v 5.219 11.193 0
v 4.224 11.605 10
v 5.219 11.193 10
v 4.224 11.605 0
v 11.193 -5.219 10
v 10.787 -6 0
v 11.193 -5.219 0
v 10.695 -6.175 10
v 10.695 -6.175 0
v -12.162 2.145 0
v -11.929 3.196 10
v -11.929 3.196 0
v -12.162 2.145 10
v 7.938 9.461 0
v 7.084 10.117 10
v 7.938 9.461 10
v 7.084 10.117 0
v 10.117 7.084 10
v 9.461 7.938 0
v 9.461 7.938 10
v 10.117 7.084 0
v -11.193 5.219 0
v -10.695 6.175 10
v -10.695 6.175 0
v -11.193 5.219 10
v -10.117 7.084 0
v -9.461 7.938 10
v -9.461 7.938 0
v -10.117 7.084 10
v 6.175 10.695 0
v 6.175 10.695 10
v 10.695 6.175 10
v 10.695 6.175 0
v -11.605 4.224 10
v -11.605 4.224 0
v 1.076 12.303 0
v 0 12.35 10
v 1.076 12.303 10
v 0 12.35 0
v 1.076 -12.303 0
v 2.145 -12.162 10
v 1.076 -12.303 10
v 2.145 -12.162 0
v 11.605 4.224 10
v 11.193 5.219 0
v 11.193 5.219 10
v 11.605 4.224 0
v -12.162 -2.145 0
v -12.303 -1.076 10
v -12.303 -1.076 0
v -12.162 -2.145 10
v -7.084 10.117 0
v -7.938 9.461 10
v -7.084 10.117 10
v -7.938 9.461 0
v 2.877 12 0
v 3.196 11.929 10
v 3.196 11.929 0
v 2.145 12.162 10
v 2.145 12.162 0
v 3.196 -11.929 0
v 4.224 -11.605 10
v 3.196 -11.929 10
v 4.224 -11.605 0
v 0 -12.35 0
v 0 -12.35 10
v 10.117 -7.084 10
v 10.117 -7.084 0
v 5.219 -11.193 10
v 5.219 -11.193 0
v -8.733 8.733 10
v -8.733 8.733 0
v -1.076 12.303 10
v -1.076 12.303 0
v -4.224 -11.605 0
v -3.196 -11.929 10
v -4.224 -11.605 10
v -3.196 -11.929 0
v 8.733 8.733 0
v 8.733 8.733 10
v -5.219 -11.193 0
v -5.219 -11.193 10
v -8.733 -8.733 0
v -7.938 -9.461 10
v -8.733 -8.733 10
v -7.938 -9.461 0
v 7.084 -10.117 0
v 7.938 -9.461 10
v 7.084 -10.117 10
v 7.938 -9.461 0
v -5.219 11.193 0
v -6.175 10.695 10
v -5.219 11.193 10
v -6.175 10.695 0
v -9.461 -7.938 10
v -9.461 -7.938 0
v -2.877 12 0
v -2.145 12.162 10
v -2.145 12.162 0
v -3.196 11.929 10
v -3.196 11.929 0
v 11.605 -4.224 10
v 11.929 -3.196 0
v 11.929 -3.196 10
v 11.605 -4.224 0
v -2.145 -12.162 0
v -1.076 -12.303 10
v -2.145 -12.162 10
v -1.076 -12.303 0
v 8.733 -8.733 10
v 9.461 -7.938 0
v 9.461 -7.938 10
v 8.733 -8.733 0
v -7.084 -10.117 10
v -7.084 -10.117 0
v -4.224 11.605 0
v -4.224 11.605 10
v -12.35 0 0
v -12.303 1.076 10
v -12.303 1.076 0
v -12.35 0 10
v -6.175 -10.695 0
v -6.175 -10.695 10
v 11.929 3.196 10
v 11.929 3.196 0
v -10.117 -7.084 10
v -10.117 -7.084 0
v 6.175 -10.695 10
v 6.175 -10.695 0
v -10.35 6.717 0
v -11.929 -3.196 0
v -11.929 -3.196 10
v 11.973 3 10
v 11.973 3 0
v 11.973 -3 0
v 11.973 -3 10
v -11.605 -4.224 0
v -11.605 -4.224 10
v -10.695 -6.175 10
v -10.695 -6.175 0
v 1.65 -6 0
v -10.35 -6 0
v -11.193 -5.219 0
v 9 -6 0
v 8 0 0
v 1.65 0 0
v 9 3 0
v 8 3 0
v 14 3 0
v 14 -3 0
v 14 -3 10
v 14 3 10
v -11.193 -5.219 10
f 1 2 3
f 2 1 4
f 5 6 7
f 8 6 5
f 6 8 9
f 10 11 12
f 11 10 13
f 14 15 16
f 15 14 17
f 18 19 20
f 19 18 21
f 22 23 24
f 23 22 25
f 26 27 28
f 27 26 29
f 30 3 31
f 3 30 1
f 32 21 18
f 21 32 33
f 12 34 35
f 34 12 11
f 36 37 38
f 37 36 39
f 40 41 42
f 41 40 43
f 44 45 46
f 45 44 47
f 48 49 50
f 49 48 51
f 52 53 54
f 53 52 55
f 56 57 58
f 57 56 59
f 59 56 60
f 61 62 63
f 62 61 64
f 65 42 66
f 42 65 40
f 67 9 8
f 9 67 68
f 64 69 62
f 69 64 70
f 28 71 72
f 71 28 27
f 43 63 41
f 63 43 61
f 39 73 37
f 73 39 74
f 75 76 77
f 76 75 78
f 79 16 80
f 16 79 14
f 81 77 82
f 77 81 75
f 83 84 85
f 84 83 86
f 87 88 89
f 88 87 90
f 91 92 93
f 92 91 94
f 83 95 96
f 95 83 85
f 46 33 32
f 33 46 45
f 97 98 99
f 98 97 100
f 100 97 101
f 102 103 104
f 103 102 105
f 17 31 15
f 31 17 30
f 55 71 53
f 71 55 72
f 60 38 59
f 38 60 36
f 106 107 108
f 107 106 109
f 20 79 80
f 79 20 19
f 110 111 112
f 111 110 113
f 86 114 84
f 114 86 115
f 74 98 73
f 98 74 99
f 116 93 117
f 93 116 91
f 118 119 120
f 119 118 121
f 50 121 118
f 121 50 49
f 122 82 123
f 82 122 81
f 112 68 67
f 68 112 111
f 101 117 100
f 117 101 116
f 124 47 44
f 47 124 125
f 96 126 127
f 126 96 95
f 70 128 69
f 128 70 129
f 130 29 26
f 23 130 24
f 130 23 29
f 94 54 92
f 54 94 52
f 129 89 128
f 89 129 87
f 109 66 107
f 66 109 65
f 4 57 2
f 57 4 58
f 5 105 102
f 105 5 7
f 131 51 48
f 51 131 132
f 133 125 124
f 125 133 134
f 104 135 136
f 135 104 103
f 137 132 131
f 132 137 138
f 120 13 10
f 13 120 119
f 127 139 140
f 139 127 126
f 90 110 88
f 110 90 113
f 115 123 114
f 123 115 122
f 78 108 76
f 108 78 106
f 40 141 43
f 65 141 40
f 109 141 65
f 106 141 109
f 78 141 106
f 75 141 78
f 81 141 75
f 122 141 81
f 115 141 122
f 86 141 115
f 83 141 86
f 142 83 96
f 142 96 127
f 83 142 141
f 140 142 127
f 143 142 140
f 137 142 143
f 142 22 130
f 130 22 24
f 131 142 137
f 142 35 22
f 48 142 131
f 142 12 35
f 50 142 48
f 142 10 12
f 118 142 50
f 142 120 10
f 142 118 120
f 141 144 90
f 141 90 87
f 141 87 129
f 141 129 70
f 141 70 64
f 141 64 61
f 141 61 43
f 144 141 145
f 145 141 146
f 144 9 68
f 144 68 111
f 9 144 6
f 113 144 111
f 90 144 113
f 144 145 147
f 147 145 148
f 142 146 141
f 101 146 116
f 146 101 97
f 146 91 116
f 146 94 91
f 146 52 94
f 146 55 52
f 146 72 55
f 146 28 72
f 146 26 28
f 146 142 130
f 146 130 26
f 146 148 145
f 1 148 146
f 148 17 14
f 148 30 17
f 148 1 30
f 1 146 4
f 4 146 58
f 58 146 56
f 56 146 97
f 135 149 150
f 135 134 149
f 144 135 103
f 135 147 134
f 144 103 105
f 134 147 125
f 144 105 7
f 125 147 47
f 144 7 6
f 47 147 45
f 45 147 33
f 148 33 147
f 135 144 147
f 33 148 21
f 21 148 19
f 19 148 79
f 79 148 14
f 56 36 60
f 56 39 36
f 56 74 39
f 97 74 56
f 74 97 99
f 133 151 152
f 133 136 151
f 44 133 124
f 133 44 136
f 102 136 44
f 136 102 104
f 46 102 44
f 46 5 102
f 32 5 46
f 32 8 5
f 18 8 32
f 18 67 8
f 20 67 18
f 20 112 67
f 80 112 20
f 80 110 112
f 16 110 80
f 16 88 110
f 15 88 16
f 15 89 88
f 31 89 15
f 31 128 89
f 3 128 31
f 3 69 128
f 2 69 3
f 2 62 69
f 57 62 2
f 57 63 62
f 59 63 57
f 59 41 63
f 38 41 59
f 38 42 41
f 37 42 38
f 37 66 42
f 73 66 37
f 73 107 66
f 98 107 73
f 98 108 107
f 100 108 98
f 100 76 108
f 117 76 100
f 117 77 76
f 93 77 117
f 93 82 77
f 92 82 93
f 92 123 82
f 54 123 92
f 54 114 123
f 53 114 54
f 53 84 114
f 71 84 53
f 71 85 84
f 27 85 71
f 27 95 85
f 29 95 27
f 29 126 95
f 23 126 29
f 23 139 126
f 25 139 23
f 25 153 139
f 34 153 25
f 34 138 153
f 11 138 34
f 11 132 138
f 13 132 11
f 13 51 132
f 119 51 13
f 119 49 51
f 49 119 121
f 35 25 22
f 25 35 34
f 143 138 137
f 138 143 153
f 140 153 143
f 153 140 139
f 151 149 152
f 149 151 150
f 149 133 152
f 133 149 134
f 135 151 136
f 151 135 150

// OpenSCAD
// Stand-off clip - a ring that snaps onto a round stand rod, with a separate ring for a
// piece of tubing, joined by a bridge. Printed flat (an extruded 2-D profile): the two rings
// do not touch the bed until they are placed over the rod they are meant to hold. NOVEL part.
//

rod_d   = 12.7;
clearance = 3;
ring_w  = 3;
bridge_w = 6;
height  = 10;

$fn = 72;

inner  = rod_d + 2 * clearance;
outer  = inner + 2 * ring_w;
t      = ring_w;

opening = 10;
bridge_h = 4;

difference() {
    union() {
        ring(outer, inner, t);                 // rod ring
        ring(6, 6 - 2 * t, t, pos = 15);          // tubing ring
        translate([8, -3, 0]) cube([bridge_w, 6, height]);   // bridge between them
    }
    translate([-(inner / 2 + 1), -opening / 2 - 1, 0]) rotate([-90, 0, 0])
        cube([opening + 2, 2 * (opening / 2 + 1), height + 2]);              // -X opening in the rod ring
    translate([15 - 6, -opening / 2 - 1, 0]) rotate([-90, 0, 0]) cube([opening + 2, 2 * (opening / 2 + 1), height + 2]);  // +X opening in the tubing ring
}

// Reusable ring: inner diameter inner, wall t, centred (x, y). An opening of size d is cut on the +x side.
module ring(outer, inner, t, x = 0, y = 0, d = 10) {
    $fn = 72;
    w = min(t, d / 2 - 1);                 // keep the wall thicker than half the opening
    difference() {
        cylinder(h = height, d = outer);
        translate([x - (inner / 2 + 1), y, 0]) rotate([-90, 0, 0]) cube([inner + 2 * w, d + 2, height + 2]);
    }
}
